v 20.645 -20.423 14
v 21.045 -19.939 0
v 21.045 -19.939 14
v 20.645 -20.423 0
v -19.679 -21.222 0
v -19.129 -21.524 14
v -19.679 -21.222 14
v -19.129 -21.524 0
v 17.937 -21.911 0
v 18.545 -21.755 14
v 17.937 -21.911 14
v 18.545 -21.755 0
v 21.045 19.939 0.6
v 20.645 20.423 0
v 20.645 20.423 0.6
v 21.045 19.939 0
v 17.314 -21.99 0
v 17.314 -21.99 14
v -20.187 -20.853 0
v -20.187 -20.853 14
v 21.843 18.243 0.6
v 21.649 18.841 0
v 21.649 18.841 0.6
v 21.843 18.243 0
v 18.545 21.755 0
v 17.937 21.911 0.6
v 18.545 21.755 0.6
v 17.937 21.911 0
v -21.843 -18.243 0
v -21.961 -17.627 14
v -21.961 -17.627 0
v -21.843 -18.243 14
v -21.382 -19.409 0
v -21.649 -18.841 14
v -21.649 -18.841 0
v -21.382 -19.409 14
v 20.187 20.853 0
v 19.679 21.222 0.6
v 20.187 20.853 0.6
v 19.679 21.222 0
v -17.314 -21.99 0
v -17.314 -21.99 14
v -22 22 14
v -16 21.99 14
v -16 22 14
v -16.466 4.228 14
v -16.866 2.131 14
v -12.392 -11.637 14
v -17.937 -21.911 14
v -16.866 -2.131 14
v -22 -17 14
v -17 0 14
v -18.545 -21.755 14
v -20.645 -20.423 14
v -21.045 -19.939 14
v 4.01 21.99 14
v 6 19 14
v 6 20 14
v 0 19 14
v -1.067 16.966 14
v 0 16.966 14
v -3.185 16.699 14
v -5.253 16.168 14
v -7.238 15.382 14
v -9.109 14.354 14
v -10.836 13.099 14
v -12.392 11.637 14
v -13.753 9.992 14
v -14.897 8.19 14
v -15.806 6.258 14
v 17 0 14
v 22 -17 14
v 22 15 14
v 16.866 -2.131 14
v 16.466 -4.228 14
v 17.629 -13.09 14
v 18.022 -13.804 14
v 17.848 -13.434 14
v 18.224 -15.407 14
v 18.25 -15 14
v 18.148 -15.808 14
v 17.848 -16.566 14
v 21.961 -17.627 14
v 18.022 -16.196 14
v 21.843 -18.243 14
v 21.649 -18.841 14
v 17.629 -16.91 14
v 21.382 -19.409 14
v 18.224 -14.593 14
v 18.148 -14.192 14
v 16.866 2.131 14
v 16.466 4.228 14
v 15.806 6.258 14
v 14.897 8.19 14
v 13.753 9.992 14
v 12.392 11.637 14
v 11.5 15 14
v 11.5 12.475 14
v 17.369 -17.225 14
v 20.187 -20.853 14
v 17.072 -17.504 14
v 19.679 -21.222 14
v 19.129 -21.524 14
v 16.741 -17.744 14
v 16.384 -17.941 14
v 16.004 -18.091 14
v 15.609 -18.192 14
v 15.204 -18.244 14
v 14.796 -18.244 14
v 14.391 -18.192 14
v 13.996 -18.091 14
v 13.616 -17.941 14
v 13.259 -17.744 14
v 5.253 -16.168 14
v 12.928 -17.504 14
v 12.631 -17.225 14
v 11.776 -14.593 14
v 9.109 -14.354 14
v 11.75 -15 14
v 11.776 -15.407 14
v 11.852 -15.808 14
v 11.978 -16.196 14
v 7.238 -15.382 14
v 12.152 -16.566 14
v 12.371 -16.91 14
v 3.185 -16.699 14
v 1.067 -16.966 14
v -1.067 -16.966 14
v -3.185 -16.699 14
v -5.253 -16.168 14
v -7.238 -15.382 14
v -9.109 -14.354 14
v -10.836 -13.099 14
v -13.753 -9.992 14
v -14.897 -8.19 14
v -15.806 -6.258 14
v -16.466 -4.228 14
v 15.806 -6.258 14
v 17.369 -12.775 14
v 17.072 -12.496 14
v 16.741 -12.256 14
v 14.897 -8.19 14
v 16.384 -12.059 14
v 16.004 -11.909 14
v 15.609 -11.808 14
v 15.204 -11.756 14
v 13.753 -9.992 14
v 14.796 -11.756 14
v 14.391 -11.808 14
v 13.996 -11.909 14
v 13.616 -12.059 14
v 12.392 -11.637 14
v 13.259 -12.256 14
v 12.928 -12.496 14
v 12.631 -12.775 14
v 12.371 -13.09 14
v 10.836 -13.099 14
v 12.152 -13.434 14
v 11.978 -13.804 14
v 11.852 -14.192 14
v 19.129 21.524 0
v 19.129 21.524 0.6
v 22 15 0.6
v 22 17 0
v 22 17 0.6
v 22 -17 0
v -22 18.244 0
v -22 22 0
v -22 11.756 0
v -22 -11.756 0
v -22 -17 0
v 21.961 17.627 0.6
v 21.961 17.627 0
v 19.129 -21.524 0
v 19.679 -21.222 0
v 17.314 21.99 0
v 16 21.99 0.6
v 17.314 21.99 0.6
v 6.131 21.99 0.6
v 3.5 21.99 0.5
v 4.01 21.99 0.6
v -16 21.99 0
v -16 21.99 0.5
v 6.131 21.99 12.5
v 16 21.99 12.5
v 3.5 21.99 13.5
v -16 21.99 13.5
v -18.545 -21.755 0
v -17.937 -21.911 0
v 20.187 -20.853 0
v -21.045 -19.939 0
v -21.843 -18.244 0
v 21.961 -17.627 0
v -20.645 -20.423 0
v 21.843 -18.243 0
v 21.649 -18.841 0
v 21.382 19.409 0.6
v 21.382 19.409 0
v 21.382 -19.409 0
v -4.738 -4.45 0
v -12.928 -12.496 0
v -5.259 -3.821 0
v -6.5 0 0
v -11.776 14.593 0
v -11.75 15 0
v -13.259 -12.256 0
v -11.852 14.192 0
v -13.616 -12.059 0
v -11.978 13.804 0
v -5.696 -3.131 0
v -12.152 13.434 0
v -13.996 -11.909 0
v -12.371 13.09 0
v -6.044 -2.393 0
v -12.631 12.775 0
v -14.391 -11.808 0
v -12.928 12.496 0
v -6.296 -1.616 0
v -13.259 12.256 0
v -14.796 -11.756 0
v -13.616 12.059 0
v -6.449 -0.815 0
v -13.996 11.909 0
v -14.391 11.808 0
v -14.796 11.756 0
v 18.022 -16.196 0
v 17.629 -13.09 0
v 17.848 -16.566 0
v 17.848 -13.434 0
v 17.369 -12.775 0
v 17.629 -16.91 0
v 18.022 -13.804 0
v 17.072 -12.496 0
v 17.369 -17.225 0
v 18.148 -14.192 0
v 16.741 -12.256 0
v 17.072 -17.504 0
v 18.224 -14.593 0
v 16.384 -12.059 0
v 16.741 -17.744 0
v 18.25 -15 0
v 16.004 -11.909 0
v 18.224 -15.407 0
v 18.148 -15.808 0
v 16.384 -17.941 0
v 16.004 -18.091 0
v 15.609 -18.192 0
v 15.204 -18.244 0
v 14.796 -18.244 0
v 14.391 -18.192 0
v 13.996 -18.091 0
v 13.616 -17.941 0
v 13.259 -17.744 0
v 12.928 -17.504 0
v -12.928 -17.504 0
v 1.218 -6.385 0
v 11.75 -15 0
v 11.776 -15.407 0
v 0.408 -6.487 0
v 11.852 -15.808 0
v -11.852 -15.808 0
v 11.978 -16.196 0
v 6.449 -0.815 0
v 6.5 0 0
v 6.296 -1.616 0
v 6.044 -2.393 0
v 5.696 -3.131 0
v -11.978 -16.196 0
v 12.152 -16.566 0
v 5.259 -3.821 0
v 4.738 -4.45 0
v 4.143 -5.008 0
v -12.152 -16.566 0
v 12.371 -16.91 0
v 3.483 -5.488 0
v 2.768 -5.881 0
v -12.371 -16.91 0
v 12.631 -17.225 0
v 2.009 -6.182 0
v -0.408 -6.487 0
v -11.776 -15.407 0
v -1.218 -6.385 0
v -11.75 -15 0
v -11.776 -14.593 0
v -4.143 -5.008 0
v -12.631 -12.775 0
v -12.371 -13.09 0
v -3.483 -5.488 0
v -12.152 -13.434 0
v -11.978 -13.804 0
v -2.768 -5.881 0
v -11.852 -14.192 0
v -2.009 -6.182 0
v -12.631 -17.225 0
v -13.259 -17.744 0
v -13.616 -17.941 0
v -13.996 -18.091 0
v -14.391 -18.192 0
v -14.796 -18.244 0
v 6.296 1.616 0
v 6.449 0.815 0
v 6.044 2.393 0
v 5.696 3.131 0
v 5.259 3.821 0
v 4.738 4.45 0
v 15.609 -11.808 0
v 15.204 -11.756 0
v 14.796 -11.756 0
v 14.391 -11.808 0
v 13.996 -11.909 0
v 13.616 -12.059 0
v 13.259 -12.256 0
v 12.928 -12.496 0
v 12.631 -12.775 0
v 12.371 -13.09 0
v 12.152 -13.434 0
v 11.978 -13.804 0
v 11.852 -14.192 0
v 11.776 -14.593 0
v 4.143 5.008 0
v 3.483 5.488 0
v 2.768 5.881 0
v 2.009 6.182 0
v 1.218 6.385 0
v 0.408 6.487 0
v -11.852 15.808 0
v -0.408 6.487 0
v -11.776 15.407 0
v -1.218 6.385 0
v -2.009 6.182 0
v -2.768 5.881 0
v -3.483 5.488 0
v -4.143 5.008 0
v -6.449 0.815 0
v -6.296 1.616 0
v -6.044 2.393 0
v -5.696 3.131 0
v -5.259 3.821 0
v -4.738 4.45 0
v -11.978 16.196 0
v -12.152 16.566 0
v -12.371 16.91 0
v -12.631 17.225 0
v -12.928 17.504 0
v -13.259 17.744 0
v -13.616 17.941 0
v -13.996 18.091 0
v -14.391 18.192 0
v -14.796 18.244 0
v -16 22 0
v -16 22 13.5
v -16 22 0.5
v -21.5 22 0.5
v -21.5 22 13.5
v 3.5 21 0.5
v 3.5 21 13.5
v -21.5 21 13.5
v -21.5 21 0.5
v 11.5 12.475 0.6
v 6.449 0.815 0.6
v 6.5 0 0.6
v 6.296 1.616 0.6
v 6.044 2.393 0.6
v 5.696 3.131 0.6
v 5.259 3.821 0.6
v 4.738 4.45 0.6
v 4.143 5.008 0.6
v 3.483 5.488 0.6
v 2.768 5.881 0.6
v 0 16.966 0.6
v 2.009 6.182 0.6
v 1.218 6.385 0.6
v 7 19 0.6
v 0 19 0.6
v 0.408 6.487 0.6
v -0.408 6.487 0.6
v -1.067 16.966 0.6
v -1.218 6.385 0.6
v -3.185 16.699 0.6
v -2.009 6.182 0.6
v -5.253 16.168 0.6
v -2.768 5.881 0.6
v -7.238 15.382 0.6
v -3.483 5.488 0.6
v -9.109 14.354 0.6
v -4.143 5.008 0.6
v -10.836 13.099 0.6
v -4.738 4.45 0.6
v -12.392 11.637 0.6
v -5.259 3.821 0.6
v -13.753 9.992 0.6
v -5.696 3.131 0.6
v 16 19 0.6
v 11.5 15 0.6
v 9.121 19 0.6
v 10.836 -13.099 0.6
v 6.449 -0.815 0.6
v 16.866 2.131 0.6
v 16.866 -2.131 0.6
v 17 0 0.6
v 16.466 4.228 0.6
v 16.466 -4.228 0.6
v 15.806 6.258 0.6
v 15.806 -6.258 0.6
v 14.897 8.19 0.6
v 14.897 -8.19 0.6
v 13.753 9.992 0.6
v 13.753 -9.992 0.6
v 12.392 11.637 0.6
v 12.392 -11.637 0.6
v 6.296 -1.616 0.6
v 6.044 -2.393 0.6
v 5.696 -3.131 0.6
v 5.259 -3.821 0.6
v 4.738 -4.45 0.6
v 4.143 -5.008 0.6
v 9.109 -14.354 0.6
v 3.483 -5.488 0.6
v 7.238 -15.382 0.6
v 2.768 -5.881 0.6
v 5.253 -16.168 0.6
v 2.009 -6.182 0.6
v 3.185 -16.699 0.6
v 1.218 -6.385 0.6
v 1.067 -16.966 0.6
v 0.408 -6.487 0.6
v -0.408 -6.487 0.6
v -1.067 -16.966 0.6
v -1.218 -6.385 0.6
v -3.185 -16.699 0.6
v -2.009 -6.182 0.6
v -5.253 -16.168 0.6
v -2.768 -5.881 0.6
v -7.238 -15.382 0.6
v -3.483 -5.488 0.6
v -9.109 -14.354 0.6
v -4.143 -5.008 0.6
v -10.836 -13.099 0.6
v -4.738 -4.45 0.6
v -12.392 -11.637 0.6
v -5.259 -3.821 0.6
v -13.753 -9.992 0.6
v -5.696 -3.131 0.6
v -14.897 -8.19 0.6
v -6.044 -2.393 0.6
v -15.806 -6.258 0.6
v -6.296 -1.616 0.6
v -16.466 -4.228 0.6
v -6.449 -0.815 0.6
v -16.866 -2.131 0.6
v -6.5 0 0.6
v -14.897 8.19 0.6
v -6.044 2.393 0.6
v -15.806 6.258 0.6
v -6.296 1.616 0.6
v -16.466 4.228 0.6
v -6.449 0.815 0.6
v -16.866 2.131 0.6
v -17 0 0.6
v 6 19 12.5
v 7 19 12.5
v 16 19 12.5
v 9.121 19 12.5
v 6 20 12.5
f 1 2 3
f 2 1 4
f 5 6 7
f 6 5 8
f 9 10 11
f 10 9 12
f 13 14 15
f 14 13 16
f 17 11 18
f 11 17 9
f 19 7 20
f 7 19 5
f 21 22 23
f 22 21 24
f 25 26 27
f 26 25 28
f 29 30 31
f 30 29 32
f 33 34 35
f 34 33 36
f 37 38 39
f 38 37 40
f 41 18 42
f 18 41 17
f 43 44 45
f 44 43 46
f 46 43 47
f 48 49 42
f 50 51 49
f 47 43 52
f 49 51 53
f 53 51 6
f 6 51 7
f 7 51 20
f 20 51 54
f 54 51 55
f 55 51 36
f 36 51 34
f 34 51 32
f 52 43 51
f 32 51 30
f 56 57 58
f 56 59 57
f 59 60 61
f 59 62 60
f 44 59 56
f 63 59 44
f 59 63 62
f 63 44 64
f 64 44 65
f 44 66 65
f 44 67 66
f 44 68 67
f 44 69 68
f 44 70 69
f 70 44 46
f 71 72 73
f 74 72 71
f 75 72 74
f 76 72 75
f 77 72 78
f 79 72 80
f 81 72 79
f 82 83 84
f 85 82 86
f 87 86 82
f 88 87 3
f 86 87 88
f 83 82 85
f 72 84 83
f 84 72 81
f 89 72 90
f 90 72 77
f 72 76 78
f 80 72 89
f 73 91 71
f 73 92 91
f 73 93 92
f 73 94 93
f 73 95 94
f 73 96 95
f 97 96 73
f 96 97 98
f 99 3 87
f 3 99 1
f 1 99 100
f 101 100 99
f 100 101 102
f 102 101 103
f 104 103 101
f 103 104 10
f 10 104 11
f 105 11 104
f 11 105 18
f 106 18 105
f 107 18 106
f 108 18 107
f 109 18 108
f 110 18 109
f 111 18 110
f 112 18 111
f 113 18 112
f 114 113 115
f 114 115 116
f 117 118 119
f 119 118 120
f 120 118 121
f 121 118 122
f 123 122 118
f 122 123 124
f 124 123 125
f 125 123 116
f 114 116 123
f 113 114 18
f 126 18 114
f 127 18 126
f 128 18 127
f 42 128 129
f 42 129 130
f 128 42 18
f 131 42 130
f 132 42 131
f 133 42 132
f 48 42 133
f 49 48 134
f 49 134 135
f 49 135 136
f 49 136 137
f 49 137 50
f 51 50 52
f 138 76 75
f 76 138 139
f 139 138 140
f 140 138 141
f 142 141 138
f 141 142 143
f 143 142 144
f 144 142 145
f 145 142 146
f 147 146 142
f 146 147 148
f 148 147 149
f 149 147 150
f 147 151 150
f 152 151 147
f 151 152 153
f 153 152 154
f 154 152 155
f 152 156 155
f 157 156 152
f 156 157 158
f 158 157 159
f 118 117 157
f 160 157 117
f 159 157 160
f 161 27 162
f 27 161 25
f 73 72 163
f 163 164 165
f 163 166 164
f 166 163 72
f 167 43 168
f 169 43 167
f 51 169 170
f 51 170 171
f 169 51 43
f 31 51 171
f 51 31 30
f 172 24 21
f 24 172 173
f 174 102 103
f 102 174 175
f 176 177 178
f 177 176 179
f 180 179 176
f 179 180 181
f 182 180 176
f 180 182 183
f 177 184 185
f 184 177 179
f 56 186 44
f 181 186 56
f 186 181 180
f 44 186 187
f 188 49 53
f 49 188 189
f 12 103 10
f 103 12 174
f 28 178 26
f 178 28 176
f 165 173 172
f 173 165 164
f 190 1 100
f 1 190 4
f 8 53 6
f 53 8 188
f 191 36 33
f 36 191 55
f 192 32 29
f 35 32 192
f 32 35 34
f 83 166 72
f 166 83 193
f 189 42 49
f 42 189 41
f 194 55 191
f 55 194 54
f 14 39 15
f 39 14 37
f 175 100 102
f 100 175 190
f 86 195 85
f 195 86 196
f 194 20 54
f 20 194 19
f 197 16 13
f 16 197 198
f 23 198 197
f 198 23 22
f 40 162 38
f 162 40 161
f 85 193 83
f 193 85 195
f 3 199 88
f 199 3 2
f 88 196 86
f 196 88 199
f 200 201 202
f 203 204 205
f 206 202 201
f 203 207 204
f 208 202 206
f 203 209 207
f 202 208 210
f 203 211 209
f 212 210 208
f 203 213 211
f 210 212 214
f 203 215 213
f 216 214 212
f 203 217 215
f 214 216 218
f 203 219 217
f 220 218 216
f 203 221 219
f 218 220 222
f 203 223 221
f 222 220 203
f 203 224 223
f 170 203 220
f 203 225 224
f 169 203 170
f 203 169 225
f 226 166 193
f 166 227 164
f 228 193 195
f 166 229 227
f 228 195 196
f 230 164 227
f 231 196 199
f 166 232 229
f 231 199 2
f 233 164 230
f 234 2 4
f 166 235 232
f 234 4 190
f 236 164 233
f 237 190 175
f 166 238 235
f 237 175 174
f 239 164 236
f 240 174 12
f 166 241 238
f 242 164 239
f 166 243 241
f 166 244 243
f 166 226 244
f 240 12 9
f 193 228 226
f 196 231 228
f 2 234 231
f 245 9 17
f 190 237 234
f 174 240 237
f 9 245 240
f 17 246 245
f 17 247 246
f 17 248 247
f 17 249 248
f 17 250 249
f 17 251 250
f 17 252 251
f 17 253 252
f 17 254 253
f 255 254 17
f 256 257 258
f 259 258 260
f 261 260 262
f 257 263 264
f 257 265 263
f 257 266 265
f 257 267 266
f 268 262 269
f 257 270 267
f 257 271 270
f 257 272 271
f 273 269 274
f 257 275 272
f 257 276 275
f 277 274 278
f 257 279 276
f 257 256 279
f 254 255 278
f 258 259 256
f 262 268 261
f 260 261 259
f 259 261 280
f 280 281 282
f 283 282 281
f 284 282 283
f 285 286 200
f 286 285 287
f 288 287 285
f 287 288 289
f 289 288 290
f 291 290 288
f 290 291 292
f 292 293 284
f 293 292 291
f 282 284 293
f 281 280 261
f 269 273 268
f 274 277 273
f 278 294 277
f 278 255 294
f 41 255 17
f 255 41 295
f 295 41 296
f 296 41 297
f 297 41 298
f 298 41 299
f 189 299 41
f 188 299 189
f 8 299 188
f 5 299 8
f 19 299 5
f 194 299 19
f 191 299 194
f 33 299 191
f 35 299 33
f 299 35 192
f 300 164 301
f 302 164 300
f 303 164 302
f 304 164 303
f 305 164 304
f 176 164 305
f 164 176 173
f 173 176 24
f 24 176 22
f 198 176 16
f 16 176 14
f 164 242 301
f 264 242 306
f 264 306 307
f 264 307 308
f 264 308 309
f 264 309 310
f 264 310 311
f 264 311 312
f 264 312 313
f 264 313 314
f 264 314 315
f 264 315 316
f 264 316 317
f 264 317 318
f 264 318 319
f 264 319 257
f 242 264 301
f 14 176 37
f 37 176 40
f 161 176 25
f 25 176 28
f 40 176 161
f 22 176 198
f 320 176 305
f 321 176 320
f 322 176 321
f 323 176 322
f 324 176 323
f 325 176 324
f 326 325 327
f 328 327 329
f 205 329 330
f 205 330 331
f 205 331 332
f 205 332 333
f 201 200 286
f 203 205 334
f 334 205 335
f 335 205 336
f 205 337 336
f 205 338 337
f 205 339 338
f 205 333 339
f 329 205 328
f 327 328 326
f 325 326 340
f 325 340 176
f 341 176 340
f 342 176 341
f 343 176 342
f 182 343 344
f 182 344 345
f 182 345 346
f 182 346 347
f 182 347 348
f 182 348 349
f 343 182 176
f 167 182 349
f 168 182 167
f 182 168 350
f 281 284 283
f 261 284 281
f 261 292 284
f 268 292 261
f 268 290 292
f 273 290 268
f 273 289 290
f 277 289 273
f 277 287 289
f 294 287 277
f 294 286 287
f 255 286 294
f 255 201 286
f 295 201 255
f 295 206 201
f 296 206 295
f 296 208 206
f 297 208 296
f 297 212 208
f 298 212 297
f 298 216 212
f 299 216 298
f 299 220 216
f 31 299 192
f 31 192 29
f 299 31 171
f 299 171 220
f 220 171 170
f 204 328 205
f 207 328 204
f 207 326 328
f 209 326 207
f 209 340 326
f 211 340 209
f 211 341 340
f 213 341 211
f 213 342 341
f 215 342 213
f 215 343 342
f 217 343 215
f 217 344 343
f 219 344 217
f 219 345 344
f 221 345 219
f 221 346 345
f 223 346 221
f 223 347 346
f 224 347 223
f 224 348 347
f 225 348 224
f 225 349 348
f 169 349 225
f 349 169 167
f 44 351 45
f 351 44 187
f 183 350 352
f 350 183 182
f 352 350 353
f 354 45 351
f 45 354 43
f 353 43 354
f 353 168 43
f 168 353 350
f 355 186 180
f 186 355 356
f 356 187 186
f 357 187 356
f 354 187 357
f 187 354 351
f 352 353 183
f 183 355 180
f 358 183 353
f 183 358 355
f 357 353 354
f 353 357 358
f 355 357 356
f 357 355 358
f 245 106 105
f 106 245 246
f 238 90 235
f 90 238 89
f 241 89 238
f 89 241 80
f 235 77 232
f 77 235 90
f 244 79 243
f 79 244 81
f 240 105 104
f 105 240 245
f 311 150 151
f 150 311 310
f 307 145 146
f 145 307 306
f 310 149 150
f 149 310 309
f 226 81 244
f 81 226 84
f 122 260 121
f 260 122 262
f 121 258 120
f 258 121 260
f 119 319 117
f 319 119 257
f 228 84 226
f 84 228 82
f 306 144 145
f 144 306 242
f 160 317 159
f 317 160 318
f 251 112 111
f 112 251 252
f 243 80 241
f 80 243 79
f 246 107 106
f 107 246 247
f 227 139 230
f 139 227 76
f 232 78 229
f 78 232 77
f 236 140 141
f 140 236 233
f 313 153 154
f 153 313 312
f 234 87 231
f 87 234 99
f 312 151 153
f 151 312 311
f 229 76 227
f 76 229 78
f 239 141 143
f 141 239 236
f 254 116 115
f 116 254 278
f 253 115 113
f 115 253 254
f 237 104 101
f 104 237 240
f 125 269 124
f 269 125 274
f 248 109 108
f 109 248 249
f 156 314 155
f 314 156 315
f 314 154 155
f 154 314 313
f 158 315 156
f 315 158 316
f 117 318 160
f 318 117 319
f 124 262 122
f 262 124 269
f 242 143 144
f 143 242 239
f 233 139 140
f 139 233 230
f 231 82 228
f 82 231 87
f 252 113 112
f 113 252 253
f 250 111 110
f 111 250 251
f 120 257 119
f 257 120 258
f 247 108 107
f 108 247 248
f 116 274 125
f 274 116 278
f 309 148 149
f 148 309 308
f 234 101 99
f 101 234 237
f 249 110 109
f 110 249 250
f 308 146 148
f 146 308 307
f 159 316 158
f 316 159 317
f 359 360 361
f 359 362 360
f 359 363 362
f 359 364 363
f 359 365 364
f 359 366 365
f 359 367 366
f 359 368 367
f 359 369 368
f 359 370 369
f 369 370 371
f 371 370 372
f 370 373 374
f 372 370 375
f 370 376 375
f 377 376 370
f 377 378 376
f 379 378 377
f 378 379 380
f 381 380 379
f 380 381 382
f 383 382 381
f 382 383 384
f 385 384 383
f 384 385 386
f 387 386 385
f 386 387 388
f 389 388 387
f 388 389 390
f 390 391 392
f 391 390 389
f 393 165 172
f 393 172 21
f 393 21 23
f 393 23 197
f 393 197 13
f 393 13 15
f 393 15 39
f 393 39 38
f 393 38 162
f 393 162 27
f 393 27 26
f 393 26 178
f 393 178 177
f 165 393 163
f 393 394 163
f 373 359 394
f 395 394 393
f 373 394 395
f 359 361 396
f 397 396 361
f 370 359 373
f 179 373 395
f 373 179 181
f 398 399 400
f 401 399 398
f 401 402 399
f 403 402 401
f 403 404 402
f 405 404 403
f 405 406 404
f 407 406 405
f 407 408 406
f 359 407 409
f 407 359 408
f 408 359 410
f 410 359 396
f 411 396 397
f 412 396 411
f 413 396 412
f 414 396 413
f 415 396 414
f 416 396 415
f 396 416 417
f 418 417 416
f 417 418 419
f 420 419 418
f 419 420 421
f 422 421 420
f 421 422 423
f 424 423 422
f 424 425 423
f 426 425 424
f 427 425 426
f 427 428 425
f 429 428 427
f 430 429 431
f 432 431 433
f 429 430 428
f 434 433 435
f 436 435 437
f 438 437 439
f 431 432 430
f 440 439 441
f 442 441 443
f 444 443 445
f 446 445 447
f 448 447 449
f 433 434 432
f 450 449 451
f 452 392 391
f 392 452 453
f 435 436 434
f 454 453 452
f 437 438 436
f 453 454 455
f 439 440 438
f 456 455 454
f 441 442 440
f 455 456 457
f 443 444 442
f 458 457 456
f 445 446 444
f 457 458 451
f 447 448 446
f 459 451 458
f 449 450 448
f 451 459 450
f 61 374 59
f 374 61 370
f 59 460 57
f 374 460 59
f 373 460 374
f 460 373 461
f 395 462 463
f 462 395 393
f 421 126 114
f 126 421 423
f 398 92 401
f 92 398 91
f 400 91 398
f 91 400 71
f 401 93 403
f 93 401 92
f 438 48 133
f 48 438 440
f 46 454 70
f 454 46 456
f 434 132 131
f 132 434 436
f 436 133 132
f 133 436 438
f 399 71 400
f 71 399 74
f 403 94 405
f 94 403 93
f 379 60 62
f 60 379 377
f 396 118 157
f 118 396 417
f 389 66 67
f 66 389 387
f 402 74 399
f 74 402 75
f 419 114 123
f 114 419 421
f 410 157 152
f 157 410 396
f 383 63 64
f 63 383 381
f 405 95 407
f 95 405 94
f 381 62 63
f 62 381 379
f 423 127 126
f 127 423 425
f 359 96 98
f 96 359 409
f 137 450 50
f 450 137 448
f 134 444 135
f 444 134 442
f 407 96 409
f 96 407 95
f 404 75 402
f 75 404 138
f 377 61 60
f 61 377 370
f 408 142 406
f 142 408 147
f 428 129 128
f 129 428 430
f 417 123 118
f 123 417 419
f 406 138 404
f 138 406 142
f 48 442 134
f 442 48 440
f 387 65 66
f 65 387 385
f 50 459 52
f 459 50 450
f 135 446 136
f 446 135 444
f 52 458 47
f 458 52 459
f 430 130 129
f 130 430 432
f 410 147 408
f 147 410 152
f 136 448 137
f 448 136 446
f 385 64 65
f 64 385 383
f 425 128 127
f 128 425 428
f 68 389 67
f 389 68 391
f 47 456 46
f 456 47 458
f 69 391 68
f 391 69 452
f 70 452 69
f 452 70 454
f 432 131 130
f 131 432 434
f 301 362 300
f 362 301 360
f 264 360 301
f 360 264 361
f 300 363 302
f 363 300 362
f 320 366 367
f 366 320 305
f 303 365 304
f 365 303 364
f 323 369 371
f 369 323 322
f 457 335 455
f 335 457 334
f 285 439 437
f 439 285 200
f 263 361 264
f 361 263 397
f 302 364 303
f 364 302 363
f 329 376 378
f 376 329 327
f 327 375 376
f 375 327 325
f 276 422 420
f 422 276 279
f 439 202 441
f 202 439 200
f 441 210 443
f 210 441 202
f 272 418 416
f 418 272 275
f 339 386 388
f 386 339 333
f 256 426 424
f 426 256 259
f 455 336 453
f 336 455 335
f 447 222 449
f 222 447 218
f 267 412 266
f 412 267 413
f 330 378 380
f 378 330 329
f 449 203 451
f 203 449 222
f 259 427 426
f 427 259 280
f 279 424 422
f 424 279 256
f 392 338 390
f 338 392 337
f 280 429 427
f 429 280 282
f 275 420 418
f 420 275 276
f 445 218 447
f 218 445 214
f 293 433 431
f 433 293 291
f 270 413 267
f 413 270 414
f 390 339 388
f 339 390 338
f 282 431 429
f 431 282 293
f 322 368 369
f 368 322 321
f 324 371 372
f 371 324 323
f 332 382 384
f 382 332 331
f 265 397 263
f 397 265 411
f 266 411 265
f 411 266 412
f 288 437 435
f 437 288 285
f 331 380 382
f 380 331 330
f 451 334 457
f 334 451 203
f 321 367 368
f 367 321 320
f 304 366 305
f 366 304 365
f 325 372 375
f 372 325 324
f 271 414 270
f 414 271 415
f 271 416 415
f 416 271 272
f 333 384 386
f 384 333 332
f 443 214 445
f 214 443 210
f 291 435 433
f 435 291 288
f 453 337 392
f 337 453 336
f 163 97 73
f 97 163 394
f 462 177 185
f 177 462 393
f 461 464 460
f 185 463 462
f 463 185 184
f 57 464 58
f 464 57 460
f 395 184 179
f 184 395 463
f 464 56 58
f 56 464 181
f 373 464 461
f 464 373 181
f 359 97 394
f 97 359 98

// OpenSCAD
$fn = 50;


difference() {
	union() {
		hull() {
			translate(v = [-17.0000000000, 17.0000000000, 0]) {
				cylinder(h = 14, r = 5);
			}
			translate(v = [17.0000000000, 17.0000000000, 0]) {
				cylinder(h = 14, r = 5);
			}
			translate(v = [-17.0000000000, -17.0000000000, 0]) {
				cylinder(h = 14, r = 5);
			}
			translate(v = [17.0000000000, -17.0000000000, 0]) {
				cylinder(h = 14, r = 5);
			}
		}
		translate(v = [-22.0000000000, 16.0000000000, 0]) {
			cube(size = [6, 6, 14]);
		}
	}
	union() {
		translate(v = [-22.5000000000, -15.0000000000, -250.0000000000]) {
			rotate(a = [0, 0, 0]) {
				difference() {
					union() {
						hull() {
							translate(v = [7.5000000000, 0, 0]) {
								cylinder(h = 250, r = 3.2500000000, r1 = 3.2500000000, r2 = 3.2500000000);
							}
							translate(v = [-7.5000000000, 0, 0]) {
								cylinder(h = 250, r = 3.2500000000, r1 = 3.2500000000, r2 = 3.2500000000);
							}
						}
					}
					union();
				}
			}
		}
		translate(v = [-22.5000000000, 15.0000000000, -250.0000000000]) {
			rotate(a = [0, 0, 0]) {
				difference() {
					union() {
						hull() {
							translate(v = [7.5000000000, 0, 0]) {
								cylinder(h = 250, r = 3.2500000000, r1 = 3.2500000000, r2 = 3.2500000000);
							}
							translate(v = [-7.5000000000, 0, 0]) {
								cylinder(h = 250, r = 3.2500000000, r1 = 3.2500000000, r2 = 3.2500000000);
							}
						}
					}
					union();
				}
			}
		}
		translate(v = [-21.5000000000, 21.0000000000, 0.5000000000]) {
			cube(size = [25, 1, 13.0000000000]);
		}
		translate(v = [15.0000000000, -15.0000000000, -50.0000000000]) {
			cylinder(h = 100, r = 3.2500000000);
		}
		translate(v = [0.0000000000, 11.0000000000, 0.6000000000]) {
			cube(size = [11, 8, 16.4000000000]);
		}
		translate(v = [0, 0, 0.6000000000]) {
			cylinder(h = 16.4000000000, r = 17.0000000000);
		}
		translate(v = [0, 0, -7.0000000000]) {
			cylinder(h = 14, r = 6.5000000000);
		}
		translate(v = [0.0000000000, 15.0000000000, 0.6000000000]) {
			cube(size = [22.0000000000, 4, 16.4000000000]);
		}
		translate(v = [16.0000000000, 15.0000000000, 0.6000000000]) {
			cube(size = [6, 7, 16.4000000000]);
		}
		translate(v = [6.0000000000, 15.0000000000, 12.5000000000]) {
			cube(size = [16, 7, 1.5000000000]);
		}
		translate(v = [3.2500000000, 22.7500000000, 0.6000000000]) {
			rotate(a = [0, 0, -45]) {
				cube(size = [7.5000000000, 1.5000000000, 16.4000000000]);
			}
		}
		translate(v = [2.5000000000, 10.0000000000, 0.6000000000]) {
			cube(size = [9.0000000000, 5, 13.4000000000]);
		}
	}
}
